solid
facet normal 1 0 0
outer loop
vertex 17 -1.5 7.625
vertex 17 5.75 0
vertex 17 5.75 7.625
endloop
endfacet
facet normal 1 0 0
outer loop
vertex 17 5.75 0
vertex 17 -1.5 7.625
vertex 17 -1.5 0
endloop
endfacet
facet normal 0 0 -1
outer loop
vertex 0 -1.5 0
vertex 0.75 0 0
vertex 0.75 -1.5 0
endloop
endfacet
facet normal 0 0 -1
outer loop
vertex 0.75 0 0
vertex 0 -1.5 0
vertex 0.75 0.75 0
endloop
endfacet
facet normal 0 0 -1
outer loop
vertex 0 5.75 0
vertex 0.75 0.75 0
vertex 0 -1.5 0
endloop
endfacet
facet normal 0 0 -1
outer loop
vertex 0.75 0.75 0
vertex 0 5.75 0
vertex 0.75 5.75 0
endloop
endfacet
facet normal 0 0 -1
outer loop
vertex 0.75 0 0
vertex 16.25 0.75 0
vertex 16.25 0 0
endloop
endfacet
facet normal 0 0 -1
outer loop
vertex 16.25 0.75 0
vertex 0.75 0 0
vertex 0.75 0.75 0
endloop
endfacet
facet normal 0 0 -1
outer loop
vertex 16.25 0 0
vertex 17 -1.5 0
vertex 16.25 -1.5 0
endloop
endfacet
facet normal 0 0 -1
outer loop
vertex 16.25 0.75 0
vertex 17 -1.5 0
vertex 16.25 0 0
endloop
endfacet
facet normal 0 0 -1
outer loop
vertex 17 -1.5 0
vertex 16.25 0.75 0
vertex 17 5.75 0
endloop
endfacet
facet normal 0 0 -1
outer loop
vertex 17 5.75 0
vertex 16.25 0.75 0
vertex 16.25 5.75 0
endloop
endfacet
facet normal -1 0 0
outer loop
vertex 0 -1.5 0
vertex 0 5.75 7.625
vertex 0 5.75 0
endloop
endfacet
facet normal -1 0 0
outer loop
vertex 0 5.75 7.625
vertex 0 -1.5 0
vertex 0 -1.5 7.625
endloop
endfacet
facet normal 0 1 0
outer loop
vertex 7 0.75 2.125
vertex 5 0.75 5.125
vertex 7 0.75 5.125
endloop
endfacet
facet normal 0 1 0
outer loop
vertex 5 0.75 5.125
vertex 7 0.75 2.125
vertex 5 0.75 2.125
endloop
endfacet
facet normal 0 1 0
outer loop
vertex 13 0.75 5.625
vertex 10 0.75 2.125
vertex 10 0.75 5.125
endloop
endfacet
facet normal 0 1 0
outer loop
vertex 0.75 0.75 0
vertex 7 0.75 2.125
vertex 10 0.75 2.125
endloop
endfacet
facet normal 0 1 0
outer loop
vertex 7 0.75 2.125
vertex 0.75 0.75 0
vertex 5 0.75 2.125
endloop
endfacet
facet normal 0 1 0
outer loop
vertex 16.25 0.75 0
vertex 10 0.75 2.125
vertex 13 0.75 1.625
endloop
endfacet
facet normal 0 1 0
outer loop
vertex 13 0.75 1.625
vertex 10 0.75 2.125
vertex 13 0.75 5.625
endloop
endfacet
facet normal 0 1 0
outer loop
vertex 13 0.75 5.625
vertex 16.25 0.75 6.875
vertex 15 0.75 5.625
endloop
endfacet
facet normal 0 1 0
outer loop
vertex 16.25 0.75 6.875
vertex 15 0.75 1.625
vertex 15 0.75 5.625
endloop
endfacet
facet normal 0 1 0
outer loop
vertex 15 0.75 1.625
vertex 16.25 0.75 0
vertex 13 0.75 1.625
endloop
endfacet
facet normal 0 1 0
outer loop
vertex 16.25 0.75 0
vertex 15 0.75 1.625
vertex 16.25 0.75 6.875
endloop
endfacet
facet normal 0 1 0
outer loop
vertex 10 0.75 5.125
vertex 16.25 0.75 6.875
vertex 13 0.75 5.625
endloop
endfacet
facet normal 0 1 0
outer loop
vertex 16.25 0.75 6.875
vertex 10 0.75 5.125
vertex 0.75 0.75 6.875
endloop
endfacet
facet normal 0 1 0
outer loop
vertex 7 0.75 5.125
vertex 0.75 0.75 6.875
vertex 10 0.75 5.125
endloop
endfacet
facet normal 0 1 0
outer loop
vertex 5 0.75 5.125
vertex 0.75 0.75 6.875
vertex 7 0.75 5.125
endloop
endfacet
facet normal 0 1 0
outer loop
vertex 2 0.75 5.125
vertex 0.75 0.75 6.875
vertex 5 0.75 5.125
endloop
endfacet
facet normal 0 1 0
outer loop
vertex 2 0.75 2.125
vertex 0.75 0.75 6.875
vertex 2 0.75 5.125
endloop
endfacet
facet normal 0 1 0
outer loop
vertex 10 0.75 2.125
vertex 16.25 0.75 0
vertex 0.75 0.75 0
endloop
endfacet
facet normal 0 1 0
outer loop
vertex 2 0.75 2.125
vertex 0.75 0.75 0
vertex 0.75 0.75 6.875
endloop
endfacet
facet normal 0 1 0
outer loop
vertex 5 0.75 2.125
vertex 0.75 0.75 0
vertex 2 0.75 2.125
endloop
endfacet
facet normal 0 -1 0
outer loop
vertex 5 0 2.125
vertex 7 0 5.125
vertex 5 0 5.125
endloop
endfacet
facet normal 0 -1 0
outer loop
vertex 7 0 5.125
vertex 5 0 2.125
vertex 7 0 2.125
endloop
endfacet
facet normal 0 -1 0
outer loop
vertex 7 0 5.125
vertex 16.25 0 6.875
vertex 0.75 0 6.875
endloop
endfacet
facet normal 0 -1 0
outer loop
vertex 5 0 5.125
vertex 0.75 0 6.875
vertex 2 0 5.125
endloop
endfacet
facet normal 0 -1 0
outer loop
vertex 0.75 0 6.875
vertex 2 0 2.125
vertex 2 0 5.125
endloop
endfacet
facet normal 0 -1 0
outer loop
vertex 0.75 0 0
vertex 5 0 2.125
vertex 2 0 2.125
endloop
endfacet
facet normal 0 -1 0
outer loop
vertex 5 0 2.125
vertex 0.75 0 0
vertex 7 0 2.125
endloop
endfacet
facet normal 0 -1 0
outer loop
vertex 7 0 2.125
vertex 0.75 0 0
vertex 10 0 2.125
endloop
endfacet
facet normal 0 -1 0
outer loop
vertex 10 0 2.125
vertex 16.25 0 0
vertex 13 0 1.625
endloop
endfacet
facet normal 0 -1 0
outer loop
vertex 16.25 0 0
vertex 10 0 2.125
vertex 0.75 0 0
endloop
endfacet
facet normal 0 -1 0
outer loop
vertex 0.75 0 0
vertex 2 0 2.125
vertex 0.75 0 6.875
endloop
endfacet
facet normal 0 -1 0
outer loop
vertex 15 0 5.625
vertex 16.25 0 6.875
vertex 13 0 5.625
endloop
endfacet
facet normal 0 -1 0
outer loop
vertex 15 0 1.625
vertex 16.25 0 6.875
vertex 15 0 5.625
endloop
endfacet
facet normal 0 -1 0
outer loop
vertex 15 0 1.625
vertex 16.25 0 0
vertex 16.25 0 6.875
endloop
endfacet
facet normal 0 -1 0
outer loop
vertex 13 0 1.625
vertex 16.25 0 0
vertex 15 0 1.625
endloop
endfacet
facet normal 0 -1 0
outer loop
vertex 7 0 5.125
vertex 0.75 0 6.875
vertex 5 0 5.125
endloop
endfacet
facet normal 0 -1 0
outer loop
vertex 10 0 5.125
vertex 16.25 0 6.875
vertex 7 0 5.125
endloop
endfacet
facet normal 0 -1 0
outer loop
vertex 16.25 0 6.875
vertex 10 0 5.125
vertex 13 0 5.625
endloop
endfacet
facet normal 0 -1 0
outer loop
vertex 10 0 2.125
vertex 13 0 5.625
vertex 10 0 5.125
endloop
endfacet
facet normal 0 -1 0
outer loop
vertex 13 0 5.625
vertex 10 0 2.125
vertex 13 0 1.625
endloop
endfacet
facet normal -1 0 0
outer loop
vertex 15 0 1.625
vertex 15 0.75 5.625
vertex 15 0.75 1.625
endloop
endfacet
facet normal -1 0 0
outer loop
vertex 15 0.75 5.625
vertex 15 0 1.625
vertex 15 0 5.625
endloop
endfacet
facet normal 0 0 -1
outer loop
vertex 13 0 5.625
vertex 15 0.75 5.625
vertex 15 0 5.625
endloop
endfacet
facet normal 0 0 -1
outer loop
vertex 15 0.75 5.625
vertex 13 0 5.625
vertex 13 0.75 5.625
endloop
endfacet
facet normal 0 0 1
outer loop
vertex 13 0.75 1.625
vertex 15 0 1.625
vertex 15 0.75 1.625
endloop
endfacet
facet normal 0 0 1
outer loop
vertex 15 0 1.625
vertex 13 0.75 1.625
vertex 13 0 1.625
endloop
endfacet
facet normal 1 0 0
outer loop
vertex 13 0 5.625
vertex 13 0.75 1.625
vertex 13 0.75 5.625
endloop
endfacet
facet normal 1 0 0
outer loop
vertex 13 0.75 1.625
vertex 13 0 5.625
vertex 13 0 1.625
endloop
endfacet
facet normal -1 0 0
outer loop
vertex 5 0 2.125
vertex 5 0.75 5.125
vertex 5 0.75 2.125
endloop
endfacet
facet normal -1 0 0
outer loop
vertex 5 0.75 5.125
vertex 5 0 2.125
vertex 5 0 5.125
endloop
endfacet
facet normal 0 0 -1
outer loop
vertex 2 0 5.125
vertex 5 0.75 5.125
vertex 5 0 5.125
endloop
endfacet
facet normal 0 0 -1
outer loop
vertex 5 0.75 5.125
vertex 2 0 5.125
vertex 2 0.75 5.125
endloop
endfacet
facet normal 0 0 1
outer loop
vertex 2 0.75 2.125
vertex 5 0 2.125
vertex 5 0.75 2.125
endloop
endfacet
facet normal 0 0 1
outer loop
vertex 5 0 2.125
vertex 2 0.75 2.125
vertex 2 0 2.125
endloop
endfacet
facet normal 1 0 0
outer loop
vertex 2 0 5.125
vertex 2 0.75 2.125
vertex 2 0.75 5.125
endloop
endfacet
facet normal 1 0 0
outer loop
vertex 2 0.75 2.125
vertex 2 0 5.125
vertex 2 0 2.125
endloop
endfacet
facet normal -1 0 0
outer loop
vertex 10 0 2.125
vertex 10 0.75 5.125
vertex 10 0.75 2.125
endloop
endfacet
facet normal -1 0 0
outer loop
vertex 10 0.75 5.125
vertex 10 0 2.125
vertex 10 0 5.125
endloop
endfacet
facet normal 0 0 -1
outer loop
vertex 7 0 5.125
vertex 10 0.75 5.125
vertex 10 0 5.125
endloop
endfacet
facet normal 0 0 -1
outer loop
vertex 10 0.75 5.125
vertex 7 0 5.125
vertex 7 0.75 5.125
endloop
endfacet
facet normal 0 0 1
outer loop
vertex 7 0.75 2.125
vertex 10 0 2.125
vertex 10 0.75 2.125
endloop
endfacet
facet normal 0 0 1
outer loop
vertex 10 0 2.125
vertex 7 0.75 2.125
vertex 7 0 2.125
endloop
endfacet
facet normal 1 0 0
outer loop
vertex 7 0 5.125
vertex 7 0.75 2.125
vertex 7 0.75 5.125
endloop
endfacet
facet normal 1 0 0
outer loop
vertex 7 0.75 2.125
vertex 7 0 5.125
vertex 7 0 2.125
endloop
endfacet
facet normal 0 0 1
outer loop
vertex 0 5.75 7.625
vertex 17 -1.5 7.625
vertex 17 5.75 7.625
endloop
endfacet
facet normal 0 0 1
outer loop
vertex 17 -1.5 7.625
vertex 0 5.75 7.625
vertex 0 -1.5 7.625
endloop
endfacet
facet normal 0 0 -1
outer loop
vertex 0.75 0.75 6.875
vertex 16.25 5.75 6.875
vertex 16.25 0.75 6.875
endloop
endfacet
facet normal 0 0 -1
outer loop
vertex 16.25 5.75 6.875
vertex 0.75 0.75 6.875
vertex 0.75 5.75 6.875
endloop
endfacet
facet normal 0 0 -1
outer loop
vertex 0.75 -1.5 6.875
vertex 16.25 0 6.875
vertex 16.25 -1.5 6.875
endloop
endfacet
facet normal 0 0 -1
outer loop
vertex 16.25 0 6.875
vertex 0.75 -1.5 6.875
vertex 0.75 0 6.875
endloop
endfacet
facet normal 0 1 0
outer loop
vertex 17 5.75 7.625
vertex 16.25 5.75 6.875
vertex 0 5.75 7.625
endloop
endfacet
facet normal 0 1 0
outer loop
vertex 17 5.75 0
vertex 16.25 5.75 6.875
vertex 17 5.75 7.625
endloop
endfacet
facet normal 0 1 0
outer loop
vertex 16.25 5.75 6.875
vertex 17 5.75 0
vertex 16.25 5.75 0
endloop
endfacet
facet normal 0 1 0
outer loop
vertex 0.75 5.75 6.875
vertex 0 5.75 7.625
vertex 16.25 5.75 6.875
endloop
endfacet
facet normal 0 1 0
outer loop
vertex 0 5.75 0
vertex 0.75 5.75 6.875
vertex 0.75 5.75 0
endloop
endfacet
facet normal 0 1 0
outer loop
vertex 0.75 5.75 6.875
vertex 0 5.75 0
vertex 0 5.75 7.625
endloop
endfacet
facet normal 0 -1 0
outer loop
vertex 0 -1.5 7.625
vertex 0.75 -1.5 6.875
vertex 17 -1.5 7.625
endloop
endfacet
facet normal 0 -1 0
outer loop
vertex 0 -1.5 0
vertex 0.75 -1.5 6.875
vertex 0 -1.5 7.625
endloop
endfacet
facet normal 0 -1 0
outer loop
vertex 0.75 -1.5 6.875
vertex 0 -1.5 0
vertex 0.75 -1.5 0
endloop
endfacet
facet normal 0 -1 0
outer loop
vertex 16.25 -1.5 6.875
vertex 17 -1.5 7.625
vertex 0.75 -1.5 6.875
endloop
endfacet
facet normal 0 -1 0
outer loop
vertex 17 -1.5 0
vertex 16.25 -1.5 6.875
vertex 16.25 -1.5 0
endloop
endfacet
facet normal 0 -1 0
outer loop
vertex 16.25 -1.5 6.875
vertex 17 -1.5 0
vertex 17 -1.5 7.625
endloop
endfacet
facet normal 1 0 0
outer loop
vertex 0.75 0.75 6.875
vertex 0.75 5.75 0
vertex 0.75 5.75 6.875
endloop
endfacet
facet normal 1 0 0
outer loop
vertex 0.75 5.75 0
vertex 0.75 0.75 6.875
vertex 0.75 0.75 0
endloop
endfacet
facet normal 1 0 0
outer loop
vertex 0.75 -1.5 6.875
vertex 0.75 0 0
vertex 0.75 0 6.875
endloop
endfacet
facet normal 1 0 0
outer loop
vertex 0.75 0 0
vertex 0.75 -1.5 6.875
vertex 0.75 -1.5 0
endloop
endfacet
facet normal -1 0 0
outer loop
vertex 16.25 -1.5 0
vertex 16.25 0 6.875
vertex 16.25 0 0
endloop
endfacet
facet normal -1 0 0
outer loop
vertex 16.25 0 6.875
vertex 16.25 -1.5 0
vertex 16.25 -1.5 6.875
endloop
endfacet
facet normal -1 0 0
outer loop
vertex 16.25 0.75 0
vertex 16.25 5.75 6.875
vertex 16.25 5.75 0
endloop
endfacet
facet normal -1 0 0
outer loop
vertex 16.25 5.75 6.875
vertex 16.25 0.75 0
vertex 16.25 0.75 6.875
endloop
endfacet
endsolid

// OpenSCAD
top(false, false);

module top(bExploded, bCutView){
    
    lapDepth = 0.375;
    topOverHang =1.5; // Overhang for front of top shelf
    fanSize=3;
    outletW =2;
    outletH=4;
// Back
rotate(bCutView ? [90,0,0] : [0,0,0])
difference(){
cube([17,.75,7.25]);
translate([13,0,1.625]) cube([outletW,.75,outletH ]);
translate([2,0,2.125]) cube([fanSize,.75,fanSize]);    
translate([7,0,2.125]) cube([fanSize,.75,fanSize]);   

}

// top
rotate(bCutView ? [180,0,0] : [0,0,0])
translate(bCutView ? [0,-17,-1] : bExploded?[0,-topOverHang,10] : [0,-topOverHang,7.25-lapDepth]) 
difference(){
    // main material
cube([17,7.25,.75]);
    // Corner joint laps
cube([lapDepth,7.25, lapDepth]);
translate([17-lapDepth,0,0]) cube([lapDepth,7.25, lapDepth]);
translate([0,topOverHang,0]) cube([17,0.75,lapDepth]); // Dado cut
}
// Right side
rotate(bCutView ? [0,-90,0] : [0,0,0])
translate(bCutView?[0,1,-7.25] : bExploded?[-2,-topOverHang,0] : [0,-topOverHang,0]) 
difference(){
cube([.75,7.25,7.25]);
    // Corner joint lap
translate([lapDepth,0,7.25-lapDepth]) cube([lapDepth,7.25, lapDepth]);  
  translate([lapDepth,topOverHang,0]) cube([lapDepth,0.75,7.25]);  
}

// Left Side
rotate(bCutView ? [0,90,0] : [0,0,0])
translate(bCutView ? [-1,1,8] : bExploded?[18.25,-topOverHang,0] : [16.25,-topOverHang,0]) 
difference() {
cube([.75,7.25,7.25]);
translate([0,0,7.25-lapDepth]) cube([lapDepth,7.25, lapDepth]);
    translate([0,topOverHang,0]) cube([lapDepth,0.75,7.25]); 
}
}
